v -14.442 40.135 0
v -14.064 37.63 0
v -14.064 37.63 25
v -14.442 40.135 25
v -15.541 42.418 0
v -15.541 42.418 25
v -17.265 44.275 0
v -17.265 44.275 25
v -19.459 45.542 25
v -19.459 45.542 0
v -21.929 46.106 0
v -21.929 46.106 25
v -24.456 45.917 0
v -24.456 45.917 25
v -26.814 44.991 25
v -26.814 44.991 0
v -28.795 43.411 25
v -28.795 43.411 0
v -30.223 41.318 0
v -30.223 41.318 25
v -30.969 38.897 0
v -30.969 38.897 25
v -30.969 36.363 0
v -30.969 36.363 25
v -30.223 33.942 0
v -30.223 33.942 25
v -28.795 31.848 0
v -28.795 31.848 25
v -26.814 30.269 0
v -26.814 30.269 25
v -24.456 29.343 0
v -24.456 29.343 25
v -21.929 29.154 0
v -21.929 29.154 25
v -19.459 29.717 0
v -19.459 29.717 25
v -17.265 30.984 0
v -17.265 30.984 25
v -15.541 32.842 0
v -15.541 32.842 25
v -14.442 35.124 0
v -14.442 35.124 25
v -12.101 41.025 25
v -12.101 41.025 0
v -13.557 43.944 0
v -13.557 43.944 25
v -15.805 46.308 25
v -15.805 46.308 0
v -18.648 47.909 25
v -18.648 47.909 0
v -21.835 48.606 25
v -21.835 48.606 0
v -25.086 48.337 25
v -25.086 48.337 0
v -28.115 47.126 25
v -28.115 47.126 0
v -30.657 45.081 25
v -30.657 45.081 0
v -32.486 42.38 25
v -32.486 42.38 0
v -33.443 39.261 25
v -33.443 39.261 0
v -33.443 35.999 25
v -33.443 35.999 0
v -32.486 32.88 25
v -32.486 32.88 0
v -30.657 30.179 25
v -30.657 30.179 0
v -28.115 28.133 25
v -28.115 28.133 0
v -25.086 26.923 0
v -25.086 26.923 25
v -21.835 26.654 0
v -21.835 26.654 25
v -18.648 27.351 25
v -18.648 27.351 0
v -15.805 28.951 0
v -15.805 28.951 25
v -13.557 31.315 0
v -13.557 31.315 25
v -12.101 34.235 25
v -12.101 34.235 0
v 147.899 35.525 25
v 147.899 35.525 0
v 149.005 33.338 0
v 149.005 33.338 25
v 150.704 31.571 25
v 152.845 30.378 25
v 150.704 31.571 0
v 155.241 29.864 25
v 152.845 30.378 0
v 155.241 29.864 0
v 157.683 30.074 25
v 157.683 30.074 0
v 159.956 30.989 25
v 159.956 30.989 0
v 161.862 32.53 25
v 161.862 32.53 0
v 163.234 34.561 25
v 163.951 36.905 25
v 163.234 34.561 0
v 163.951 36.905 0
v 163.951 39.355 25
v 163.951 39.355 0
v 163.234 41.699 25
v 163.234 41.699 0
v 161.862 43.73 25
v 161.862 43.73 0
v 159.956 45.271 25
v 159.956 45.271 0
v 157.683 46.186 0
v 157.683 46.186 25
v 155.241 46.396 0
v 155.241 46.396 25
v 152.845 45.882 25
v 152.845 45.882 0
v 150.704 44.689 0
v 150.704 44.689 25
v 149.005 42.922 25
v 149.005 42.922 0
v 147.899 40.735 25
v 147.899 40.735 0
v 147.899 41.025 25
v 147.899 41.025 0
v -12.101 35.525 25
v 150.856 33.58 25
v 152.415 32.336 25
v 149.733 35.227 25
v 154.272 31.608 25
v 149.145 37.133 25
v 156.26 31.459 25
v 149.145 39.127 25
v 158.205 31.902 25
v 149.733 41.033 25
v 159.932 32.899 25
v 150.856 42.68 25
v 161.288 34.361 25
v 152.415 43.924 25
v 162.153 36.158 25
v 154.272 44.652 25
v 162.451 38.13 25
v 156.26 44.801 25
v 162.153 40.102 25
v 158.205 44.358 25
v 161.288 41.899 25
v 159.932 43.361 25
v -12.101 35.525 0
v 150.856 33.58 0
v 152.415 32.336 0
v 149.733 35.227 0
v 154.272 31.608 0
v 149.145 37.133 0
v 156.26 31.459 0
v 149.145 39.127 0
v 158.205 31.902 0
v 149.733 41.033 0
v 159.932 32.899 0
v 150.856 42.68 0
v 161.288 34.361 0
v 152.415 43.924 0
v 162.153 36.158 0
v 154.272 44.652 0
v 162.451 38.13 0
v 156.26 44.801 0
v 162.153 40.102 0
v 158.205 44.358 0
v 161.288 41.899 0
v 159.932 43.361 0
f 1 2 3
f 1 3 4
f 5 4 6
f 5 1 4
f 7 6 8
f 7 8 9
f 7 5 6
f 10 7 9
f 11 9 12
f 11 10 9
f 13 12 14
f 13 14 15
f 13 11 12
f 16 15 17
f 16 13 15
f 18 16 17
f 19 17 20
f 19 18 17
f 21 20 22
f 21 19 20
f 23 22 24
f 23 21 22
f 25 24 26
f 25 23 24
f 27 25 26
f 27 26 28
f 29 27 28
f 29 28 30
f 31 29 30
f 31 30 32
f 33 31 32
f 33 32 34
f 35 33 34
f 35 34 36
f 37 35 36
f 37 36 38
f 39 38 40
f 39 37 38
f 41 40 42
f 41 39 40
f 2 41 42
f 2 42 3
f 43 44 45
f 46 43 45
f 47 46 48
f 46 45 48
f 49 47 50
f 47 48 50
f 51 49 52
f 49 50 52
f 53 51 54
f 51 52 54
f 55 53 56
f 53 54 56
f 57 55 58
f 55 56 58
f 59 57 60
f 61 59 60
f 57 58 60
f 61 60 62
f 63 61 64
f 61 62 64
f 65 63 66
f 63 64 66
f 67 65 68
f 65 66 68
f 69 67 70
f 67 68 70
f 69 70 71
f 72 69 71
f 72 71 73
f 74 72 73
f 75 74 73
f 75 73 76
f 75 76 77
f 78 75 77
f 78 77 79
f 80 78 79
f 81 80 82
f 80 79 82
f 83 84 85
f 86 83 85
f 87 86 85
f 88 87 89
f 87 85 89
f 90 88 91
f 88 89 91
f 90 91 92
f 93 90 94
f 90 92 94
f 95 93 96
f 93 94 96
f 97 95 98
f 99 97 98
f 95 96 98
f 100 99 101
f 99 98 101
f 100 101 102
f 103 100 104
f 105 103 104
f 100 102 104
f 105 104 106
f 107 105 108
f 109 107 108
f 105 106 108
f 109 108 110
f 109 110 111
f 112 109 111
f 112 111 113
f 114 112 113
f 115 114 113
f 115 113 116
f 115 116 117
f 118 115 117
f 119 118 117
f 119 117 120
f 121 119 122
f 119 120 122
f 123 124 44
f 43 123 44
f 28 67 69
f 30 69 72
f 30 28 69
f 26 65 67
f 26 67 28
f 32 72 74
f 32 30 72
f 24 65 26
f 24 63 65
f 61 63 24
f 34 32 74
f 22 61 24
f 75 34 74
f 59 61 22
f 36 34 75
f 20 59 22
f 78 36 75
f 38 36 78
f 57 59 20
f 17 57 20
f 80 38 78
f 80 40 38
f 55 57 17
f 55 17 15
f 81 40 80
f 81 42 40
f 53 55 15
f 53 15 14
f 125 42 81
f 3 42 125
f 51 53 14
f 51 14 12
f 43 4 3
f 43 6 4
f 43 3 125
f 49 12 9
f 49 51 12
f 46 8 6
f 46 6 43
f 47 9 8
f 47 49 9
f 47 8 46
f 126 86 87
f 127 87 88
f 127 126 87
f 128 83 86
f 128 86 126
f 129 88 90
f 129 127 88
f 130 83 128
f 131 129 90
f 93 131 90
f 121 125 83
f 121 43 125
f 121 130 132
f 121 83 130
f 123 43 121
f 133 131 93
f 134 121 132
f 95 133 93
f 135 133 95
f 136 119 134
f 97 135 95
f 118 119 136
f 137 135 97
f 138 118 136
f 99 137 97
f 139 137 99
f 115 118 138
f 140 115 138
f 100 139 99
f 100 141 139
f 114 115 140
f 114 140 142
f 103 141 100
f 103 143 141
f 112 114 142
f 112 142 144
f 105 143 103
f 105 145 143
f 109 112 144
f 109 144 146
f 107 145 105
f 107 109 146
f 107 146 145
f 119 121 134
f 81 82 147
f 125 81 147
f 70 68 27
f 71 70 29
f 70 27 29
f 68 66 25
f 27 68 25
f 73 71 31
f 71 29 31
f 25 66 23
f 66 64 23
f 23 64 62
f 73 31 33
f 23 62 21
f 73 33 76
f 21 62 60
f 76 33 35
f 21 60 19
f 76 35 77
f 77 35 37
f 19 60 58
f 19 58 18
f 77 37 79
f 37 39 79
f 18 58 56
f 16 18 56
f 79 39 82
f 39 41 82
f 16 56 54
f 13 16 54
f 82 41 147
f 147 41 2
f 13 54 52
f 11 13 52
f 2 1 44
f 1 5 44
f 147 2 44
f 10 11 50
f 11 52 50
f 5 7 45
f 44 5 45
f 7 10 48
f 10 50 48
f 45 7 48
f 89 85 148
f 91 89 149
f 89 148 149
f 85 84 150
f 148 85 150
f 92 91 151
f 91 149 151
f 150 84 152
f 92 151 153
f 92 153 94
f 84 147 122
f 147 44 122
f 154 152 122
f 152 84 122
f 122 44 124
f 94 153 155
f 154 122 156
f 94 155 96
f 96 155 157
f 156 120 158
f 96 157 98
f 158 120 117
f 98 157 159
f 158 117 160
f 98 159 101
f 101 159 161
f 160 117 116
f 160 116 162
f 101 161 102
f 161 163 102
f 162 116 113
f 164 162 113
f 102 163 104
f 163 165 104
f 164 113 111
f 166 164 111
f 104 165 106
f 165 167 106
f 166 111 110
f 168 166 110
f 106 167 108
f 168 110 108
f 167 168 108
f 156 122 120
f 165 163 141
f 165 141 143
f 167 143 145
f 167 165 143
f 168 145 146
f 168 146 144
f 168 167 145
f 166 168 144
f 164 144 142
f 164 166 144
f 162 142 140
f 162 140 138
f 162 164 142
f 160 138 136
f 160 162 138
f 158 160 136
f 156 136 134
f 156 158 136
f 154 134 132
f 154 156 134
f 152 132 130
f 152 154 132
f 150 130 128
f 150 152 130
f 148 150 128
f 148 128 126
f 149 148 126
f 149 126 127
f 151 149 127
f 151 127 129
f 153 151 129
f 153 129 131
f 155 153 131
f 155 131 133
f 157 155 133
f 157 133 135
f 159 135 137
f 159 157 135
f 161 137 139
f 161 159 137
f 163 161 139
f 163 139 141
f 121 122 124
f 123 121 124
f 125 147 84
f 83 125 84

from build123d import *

# Parameters (mm, degrees)
F0_R     = 8.5
F0_R_2   = 6.6901913145
F1_DEPTH = 25


# Not quite as in the source:
# - a feature names something its author has since deleted; it is built from what else it names


with BuildPart() as f1:
    # F0 (on Top) → F1 (new body)
    with BuildSketch(Plane.XY):
        with BuildLine():
            Line((147.8986507368, 41.0247598798), (-12.1013492632, 41.0247598798))
            ThreePointArc((-12.1013492632, 41.0247598798), (-33.5643369753, 37.6297800364), (-12.1013492632, 34.2348001929))
            Line((-12.1013492632, 34.2348001929), (-12.1013492632, 35.5247598798))
            Line((-12.1013492632, 35.5247598798), (147.8986507368, 35.5247598798))
            ThreePointArc((147.8986507368, 35.5247598798), (164.0425617184, 38.1300025139), (147.8986507368, 40.735245148))
            Line((147.8986507368, 40.735245148), (147.8986507368, 41.0247598798))
        make_face()
        with Locations((-22.5643369753, 37.6297800364)):
            Circle(F0_R, mode=Mode.SUBTRACT)
        with Locations((155.7603941795, 38.1300025139)):
            Circle(F0_R_2, mode=Mode.SUBTRACT)
    extrude(amount=F1_DEPTH)


solid = f1.part
